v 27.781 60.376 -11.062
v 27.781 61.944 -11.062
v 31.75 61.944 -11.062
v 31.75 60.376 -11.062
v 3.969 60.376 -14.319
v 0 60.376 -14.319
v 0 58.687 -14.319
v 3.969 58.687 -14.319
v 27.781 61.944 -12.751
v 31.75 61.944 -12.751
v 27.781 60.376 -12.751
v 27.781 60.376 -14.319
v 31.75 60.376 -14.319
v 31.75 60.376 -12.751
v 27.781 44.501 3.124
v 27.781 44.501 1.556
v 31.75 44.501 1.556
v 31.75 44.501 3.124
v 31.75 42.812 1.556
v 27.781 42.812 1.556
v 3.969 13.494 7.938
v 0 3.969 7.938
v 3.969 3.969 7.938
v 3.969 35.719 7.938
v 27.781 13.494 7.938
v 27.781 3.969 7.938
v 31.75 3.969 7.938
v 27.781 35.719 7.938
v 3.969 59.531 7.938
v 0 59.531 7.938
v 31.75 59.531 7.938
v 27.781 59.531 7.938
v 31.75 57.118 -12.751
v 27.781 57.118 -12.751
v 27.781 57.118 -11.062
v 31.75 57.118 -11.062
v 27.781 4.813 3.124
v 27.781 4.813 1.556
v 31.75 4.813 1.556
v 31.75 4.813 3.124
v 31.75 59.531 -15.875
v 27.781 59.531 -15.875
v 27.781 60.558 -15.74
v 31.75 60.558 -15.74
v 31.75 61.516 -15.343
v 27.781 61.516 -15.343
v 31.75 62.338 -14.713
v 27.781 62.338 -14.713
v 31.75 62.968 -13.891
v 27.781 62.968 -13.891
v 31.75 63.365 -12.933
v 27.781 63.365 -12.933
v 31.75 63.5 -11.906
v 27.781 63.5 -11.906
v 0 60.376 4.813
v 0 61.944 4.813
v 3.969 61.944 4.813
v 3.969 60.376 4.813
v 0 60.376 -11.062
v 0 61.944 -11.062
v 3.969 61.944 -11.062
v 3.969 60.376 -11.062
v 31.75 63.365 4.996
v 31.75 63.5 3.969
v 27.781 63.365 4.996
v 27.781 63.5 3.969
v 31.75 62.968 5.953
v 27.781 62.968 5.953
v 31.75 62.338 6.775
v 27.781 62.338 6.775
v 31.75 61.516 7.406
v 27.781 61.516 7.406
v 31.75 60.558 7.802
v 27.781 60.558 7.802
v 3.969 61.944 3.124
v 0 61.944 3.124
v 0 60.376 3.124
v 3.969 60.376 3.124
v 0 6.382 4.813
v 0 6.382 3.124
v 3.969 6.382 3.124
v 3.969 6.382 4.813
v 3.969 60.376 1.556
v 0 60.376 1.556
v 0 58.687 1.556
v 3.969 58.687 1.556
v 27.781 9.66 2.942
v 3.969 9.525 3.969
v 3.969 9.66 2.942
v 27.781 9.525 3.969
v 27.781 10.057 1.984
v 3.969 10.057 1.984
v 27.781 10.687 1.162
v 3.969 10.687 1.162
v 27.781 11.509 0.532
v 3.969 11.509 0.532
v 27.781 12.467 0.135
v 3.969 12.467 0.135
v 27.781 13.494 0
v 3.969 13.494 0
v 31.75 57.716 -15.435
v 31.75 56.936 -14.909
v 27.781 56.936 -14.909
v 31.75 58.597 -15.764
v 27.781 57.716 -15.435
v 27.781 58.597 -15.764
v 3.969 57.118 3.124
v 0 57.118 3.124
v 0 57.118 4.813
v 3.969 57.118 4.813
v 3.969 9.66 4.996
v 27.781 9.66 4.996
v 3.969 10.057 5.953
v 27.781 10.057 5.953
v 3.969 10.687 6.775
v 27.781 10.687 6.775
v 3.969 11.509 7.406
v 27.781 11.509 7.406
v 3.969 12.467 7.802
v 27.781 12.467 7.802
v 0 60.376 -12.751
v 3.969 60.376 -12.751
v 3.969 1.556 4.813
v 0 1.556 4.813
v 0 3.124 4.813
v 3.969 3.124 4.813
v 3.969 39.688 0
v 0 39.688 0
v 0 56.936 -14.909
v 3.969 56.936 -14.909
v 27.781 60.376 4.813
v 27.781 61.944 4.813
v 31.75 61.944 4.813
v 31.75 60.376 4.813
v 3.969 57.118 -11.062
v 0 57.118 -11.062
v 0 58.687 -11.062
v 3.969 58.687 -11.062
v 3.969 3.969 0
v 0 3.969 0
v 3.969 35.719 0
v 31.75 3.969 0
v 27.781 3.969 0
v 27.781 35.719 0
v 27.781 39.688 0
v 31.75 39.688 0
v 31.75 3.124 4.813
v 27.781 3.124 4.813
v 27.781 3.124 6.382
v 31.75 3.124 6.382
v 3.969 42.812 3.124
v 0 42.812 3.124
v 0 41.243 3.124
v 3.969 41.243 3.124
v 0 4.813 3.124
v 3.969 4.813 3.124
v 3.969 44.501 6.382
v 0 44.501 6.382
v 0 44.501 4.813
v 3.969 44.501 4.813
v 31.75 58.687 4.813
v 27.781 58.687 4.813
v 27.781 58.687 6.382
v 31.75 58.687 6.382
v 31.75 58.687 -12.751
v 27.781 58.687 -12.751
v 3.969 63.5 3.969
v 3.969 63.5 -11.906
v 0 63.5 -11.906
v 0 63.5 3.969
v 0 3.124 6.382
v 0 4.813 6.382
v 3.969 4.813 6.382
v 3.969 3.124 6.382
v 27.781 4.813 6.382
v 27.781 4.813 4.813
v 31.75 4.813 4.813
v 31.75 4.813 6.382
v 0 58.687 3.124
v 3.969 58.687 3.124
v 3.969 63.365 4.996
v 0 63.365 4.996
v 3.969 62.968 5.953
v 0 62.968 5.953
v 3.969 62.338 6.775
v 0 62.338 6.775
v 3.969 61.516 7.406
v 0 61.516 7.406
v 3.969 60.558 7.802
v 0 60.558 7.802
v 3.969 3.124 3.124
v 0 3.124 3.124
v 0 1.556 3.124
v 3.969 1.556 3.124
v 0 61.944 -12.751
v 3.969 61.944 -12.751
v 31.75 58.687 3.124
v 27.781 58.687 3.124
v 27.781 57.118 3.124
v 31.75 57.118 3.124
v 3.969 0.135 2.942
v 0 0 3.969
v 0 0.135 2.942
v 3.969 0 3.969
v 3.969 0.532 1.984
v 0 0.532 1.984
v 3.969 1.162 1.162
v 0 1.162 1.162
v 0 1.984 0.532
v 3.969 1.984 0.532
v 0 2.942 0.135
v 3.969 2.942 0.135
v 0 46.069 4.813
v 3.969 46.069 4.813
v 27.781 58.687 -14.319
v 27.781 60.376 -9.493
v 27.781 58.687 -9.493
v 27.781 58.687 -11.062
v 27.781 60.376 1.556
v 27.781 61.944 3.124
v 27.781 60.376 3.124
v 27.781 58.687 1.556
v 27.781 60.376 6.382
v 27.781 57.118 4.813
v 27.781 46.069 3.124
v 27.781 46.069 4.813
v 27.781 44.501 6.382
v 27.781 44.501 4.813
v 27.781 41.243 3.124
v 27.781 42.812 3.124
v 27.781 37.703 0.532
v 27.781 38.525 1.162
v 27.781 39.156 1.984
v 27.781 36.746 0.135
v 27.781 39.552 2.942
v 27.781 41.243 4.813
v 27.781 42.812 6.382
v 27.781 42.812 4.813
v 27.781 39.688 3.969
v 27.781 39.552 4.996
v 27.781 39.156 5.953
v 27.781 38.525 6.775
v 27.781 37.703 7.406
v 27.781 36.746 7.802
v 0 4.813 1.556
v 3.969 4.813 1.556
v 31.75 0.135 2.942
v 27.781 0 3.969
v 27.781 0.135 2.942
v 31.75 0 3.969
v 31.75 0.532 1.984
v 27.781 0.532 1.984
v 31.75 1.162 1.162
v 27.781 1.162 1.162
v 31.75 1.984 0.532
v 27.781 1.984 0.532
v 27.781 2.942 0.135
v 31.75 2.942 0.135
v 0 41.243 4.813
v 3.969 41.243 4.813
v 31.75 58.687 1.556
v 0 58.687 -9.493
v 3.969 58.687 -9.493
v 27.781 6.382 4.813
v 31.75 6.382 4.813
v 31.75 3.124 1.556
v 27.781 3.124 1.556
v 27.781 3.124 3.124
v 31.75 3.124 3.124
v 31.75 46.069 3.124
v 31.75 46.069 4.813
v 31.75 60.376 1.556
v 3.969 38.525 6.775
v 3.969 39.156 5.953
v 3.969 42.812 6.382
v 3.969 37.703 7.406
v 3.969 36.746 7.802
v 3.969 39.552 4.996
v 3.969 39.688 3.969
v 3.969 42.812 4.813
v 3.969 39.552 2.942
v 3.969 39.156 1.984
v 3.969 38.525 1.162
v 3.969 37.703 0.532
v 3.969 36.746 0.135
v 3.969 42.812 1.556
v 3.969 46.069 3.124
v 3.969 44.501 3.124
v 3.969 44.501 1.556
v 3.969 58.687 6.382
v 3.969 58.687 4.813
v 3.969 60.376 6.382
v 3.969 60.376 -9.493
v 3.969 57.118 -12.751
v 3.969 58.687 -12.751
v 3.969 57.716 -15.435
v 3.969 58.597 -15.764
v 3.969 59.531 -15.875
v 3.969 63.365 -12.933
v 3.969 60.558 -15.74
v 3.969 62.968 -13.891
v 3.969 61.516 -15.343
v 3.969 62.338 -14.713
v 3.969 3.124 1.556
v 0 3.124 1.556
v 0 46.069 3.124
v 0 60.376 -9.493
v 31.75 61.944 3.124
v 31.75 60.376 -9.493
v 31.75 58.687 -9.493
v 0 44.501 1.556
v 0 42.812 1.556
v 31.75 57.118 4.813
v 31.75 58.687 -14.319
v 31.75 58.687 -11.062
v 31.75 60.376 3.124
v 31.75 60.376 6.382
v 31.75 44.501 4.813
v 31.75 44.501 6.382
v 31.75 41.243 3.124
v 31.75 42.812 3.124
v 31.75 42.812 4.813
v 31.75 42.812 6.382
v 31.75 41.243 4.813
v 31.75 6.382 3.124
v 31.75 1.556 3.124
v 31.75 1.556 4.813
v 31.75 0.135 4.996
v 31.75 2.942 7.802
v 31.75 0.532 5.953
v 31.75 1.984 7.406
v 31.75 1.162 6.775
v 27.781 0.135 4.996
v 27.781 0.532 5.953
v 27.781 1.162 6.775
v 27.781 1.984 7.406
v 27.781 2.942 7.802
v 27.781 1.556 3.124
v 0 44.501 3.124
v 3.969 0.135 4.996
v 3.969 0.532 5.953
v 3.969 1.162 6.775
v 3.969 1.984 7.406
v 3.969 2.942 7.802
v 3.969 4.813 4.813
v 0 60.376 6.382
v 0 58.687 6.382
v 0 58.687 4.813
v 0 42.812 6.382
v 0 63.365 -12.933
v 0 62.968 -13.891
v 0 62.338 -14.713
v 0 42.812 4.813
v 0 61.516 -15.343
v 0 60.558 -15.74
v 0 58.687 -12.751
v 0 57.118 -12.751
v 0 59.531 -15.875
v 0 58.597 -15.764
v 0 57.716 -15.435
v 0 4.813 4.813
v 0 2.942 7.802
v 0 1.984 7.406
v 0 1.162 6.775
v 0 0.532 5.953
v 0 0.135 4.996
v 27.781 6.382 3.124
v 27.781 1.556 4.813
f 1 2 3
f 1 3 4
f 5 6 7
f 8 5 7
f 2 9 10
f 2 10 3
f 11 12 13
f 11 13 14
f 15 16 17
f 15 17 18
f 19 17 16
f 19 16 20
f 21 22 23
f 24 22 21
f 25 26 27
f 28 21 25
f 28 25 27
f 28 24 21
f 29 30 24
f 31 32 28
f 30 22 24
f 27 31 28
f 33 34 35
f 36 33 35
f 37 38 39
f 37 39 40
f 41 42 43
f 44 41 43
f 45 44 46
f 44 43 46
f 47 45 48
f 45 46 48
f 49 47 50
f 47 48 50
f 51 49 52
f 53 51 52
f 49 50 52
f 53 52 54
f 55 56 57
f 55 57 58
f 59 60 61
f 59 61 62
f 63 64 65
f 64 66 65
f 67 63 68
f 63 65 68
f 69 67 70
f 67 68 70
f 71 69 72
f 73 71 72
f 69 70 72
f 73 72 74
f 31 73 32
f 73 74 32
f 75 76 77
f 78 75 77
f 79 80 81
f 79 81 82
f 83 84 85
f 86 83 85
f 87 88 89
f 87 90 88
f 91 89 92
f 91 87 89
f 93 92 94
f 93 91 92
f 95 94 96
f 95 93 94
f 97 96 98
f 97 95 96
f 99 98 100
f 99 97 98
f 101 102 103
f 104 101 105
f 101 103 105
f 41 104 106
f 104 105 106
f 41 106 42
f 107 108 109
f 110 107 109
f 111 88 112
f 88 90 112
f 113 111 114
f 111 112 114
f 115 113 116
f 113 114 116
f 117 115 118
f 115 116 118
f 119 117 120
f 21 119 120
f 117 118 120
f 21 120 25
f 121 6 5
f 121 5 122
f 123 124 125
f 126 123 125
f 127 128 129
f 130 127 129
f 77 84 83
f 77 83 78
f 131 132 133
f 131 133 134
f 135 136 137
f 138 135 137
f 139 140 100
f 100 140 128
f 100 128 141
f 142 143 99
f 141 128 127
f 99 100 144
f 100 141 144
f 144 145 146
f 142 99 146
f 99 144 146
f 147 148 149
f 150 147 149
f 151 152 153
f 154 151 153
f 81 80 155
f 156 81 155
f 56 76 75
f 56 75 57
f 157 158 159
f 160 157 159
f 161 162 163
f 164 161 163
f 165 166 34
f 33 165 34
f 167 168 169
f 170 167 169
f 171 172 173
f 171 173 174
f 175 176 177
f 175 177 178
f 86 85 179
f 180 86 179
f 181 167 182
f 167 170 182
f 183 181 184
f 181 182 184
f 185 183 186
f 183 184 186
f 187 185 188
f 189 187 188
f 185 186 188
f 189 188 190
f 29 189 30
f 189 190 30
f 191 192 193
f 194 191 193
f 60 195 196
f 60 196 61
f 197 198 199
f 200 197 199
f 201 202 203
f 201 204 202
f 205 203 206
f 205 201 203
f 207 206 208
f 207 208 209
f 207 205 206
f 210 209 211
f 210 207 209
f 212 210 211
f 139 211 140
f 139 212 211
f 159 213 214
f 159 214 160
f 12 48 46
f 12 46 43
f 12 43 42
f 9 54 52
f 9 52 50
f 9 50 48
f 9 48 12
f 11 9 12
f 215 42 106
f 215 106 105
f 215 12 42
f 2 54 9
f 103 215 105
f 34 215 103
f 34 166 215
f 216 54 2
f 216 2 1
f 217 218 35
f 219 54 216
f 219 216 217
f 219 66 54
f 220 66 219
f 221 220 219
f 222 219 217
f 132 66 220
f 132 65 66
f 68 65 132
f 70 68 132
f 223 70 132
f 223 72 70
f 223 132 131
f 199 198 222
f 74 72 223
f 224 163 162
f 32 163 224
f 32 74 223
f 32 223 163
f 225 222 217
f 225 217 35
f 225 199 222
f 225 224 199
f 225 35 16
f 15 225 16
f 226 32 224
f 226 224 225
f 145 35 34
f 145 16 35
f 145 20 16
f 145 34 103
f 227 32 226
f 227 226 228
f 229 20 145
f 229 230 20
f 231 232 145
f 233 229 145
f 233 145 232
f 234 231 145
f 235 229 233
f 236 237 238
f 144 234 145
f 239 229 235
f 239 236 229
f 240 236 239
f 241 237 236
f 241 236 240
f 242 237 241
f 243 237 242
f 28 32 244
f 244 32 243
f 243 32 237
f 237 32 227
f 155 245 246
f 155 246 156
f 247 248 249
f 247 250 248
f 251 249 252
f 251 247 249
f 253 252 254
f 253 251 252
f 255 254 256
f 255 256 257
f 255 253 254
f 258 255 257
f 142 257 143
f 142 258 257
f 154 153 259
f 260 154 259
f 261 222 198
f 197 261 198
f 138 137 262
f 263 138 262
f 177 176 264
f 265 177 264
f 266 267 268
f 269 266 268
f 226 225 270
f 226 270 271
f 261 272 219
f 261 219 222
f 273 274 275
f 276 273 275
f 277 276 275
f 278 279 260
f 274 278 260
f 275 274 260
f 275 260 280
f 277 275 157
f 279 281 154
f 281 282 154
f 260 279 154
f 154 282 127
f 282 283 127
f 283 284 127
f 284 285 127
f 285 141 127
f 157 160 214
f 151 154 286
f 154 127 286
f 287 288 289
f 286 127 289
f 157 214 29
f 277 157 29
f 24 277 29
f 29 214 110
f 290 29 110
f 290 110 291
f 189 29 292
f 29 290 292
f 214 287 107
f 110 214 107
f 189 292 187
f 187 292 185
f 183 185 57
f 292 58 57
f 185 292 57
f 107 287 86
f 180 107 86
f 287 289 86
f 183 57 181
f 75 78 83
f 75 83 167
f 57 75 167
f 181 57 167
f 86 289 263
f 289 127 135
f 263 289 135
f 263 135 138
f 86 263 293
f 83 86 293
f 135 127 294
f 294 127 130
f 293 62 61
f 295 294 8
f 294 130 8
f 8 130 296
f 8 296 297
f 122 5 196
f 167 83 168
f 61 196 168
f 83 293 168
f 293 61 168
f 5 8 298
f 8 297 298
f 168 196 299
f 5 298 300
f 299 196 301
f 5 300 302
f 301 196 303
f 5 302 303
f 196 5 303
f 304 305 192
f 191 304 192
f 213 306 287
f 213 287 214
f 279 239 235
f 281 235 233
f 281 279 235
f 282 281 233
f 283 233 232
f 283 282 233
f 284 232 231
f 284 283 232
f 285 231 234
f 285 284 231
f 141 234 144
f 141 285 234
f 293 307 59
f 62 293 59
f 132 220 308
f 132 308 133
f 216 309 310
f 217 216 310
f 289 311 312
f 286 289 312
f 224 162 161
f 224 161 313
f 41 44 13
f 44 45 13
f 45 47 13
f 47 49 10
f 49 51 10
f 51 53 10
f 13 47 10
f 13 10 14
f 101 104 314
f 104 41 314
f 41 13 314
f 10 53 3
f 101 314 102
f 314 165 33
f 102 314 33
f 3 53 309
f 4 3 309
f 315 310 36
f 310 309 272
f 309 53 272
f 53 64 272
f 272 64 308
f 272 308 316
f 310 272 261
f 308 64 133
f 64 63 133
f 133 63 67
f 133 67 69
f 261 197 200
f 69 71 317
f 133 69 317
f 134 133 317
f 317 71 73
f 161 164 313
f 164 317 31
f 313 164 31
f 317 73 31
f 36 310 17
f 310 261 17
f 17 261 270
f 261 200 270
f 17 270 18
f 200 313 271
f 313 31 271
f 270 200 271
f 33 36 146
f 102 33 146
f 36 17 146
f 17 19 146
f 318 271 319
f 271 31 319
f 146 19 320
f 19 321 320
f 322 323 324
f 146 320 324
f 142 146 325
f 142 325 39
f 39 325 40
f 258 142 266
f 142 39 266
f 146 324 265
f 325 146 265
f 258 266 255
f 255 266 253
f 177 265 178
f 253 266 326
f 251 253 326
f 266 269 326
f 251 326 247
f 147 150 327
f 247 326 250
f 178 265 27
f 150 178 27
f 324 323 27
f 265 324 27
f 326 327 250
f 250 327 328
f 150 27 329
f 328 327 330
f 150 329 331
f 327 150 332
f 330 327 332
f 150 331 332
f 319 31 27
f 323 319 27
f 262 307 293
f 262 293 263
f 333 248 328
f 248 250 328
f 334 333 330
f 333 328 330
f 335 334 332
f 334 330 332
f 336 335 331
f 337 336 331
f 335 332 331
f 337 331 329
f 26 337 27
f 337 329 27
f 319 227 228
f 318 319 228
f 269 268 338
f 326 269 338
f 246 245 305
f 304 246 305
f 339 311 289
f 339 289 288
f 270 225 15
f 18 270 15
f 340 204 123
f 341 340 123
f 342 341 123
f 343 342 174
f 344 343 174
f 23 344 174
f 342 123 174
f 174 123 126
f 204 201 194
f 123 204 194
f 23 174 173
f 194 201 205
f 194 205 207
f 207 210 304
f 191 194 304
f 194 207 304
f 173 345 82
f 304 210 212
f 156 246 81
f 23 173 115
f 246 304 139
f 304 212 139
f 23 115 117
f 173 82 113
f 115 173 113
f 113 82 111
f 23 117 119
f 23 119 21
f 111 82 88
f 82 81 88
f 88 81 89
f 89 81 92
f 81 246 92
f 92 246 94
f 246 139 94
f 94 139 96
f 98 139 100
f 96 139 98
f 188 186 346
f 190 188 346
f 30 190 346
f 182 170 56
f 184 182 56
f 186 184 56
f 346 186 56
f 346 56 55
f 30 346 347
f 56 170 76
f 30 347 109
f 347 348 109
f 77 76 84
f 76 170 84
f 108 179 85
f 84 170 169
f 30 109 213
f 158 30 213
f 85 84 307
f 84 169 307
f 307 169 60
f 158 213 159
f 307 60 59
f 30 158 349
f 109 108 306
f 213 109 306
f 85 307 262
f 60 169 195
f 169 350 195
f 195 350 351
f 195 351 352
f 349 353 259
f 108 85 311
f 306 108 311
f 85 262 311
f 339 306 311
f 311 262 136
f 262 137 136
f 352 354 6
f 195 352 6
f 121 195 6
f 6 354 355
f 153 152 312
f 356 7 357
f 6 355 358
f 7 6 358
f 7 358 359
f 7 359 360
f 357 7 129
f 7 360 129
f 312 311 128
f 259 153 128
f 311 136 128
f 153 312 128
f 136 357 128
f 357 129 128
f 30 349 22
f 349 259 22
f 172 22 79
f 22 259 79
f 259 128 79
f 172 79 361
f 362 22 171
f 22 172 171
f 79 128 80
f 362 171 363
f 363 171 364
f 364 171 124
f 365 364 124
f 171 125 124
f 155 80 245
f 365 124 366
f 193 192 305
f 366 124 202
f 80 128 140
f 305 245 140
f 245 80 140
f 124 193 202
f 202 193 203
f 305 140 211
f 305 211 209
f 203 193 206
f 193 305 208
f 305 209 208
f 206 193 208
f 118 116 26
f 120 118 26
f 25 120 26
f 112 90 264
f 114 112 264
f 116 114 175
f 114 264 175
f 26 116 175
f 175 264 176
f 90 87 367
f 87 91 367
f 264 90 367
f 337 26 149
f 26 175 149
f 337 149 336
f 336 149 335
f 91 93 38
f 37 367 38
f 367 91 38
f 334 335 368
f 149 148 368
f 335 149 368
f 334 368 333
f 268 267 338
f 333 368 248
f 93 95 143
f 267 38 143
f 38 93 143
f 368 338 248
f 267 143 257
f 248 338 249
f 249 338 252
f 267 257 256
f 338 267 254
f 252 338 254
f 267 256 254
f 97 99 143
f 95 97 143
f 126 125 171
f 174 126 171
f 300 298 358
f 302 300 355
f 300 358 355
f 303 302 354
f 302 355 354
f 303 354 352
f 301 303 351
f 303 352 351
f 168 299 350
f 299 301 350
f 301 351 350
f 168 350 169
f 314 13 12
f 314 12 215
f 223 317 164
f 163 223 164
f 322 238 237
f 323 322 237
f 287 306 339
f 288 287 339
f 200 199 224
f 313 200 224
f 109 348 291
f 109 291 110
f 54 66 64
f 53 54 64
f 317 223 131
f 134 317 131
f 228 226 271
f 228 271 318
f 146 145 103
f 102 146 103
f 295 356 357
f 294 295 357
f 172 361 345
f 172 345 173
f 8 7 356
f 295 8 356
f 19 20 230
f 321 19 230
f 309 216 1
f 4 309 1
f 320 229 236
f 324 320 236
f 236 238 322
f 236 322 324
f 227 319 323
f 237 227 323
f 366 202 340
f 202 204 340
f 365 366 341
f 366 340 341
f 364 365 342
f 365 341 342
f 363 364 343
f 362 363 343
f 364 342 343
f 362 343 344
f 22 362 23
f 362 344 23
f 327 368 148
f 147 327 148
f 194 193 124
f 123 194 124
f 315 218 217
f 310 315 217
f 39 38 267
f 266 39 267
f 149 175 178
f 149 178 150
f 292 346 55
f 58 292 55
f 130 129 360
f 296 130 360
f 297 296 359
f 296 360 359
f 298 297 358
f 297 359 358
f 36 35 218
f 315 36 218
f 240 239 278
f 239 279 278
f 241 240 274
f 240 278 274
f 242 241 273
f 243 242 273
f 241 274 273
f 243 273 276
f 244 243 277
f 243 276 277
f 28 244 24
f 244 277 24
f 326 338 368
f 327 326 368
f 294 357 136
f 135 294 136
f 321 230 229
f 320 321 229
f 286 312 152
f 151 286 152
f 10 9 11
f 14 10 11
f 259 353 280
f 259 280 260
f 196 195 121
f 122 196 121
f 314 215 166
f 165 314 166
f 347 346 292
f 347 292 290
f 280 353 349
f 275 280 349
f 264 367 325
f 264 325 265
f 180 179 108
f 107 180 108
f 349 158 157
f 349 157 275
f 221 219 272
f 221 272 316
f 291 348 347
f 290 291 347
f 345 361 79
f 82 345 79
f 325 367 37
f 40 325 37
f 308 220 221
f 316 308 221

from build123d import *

# Parameters (mm, degrees)
F1_DEPTH = 7.9375
F2_R     = 3.96874
F3_W     = 3.96875
F3_H     = 23.8125
F4_DEPTH = 15.875
F5_W     = 1.56845
F5_H     = 1.6891
F5_W_2   = 1.6891
F5_H_2   = 1.56845
F6_DEPTH = 31.75


# Not quite as in the source:
# - a fillet or chamfer is up to 0.001 mm smaller than in the source, because OpenCascade refuses the exact size


with BuildPart() as f1:
    # F0 (on Top) → F1 (new body)
    with BuildSketch(Plane.XY):
        Polygon((0, 63.5), (0, 0), (3.96875, 0), (3.96875, 9.525), (27.78125, 9.525), (27.78125, 0), (31.75, 0), (31.75, 63.5), (27.78125, 63.5), (27.78125, 39.6875), (3.96875, 39.6875), (3.96875, 63.5), align=None)
    extrude(amount=F1_DEPTH)

    # F2 (radius 3.96875 in the source; OpenCascade refuses exactly that, so slightly less here)
    f2_edges = [f1.edges().sort_by_distance(p)[0] for p in [
        (15.875, 39.6875, 7.9375),
        (15.875, 39.6875, 0),
        (1.984375, 63.5, 7.9375),
        (29.765625, 63.5, 7.9375),
        (1.984375, 0, 7.9375),
        (1.984375, 0, 0),
        (29.765625, 0, 7.9375),
        (29.765625, 0, 0),
        (15.875, 9.525, 7.9375),
        (15.875, 9.525, 0),
    ]]
    fillet(f2_edges, radius=F2_R)

    # F3 (on face) → F4 (join)
    with BuildSketch(Plane(origin=(0, 0, 0), x_dir=(1, 0, 0), z_dir=(0, 0, -1))):
        with Locations((29.765625, -51.59375)):
            Rectangle(F3_W, F3_H)
        with Locations((1.984375, -51.59375)):
            Rectangle(F3_W, F3_H)
    extrude(amount=F4_DEPTH)

    # F5 (on face) → F6 (cut, through all)
    with BuildSketch(Plane(origin=(0, 0, 0), x_dir=(0, -1, 0), z_dir=(-1, 0, 0))):
        with Locations((-5.597525, 3.96875)):
            Rectangle(F5_W, F5_H)
        with Locations((-3.96875, 3.96875)):
            Rectangle(F5_W_2, F5_H)
        with Locations((-3.96875, 2.339975)):
            Rectangle(F5_W_2, F5_H_2)
        with Locations((-2.339975, 3.96875)):
            Rectangle(F5_W, F5_H)
        with Locations((-3.96875, 5.597525)):
            Rectangle(F5_W_2, F5_H_2)
        with BuildLine():
            Line((-63.5, -15.875), (-59.53125, -15.875))
            ThreePointArc((-59.53125, -15.875), (-62.3375800378, -14.7125800378), (-63.5, -11.90625))
            Line((-63.5, -11.90625), (-63.5, -15.875))
        make_face()
        with BuildLine():
            Line((-59.53125, -15.875), (-39.6875, -15.875))
            Line((-39.6875, -15.875), (-39.6875, 0))
            Line((-39.6875, 0), (-56.935957382, -14.9088210299))
            ThreePointArc((-56.935957382, -14.9088210299), (-58.146597916, -15.6256202651), (-59.53125, -15.875))
        make_face()
        with Locations((-57.902475, -11.90625)):
            Rectangle(F5_W, F5_H)
        with Locations((-59.53125, -11.90625)):
            Rectangle(F5_W_2, F5_H)
        with Locations((-59.53125, -10.277475)):
            Rectangle(F5_W_2, F5_H_2)
        with Locations((-61.160025, -11.90625)):
            Rectangle(F5_W, F5_H)
        with Locations((-59.53125, -13.535025)):
            Rectangle(F5_W_2, F5_H_2)
        with Locations((-59.53125, 5.597525)):
            Rectangle(F5_W_2, F5_H_2)
        with Locations((-59.53125, 3.96875)):
            Rectangle(F5_W_2, F5_H)
        with Locations((-61.160025, 3.96875)):
            Rectangle(F5_W, F5_H)
        with Locations((-57.902475, 3.96875)):
            Rectangle(F5_W, F5_H)
        with Locations((-59.53125, 2.339975)):
            Rectangle(F5_W_2, F5_H_2)
        with Locations((-43.65625, 5.597525)):
            Rectangle(F5_W_2, F5_H_2)
        with Locations((-43.65625, 3.96875)):
            Rectangle(F5_W_2, F5_H)
        with Locations((-45.285025, 3.96875)):
            Rectangle(F5_W, F5_H)
        with Locations((-42.027475, 3.96875)):
            Rectangle(F5_W, F5_H)
        with Locations((-43.65625, 2.339975)):
            Rectangle(F5_W_2, F5_H_2)
    extrude(amount=-F6_DEPTH, mode=Mode.SUBTRACT)


solid = f1.part
